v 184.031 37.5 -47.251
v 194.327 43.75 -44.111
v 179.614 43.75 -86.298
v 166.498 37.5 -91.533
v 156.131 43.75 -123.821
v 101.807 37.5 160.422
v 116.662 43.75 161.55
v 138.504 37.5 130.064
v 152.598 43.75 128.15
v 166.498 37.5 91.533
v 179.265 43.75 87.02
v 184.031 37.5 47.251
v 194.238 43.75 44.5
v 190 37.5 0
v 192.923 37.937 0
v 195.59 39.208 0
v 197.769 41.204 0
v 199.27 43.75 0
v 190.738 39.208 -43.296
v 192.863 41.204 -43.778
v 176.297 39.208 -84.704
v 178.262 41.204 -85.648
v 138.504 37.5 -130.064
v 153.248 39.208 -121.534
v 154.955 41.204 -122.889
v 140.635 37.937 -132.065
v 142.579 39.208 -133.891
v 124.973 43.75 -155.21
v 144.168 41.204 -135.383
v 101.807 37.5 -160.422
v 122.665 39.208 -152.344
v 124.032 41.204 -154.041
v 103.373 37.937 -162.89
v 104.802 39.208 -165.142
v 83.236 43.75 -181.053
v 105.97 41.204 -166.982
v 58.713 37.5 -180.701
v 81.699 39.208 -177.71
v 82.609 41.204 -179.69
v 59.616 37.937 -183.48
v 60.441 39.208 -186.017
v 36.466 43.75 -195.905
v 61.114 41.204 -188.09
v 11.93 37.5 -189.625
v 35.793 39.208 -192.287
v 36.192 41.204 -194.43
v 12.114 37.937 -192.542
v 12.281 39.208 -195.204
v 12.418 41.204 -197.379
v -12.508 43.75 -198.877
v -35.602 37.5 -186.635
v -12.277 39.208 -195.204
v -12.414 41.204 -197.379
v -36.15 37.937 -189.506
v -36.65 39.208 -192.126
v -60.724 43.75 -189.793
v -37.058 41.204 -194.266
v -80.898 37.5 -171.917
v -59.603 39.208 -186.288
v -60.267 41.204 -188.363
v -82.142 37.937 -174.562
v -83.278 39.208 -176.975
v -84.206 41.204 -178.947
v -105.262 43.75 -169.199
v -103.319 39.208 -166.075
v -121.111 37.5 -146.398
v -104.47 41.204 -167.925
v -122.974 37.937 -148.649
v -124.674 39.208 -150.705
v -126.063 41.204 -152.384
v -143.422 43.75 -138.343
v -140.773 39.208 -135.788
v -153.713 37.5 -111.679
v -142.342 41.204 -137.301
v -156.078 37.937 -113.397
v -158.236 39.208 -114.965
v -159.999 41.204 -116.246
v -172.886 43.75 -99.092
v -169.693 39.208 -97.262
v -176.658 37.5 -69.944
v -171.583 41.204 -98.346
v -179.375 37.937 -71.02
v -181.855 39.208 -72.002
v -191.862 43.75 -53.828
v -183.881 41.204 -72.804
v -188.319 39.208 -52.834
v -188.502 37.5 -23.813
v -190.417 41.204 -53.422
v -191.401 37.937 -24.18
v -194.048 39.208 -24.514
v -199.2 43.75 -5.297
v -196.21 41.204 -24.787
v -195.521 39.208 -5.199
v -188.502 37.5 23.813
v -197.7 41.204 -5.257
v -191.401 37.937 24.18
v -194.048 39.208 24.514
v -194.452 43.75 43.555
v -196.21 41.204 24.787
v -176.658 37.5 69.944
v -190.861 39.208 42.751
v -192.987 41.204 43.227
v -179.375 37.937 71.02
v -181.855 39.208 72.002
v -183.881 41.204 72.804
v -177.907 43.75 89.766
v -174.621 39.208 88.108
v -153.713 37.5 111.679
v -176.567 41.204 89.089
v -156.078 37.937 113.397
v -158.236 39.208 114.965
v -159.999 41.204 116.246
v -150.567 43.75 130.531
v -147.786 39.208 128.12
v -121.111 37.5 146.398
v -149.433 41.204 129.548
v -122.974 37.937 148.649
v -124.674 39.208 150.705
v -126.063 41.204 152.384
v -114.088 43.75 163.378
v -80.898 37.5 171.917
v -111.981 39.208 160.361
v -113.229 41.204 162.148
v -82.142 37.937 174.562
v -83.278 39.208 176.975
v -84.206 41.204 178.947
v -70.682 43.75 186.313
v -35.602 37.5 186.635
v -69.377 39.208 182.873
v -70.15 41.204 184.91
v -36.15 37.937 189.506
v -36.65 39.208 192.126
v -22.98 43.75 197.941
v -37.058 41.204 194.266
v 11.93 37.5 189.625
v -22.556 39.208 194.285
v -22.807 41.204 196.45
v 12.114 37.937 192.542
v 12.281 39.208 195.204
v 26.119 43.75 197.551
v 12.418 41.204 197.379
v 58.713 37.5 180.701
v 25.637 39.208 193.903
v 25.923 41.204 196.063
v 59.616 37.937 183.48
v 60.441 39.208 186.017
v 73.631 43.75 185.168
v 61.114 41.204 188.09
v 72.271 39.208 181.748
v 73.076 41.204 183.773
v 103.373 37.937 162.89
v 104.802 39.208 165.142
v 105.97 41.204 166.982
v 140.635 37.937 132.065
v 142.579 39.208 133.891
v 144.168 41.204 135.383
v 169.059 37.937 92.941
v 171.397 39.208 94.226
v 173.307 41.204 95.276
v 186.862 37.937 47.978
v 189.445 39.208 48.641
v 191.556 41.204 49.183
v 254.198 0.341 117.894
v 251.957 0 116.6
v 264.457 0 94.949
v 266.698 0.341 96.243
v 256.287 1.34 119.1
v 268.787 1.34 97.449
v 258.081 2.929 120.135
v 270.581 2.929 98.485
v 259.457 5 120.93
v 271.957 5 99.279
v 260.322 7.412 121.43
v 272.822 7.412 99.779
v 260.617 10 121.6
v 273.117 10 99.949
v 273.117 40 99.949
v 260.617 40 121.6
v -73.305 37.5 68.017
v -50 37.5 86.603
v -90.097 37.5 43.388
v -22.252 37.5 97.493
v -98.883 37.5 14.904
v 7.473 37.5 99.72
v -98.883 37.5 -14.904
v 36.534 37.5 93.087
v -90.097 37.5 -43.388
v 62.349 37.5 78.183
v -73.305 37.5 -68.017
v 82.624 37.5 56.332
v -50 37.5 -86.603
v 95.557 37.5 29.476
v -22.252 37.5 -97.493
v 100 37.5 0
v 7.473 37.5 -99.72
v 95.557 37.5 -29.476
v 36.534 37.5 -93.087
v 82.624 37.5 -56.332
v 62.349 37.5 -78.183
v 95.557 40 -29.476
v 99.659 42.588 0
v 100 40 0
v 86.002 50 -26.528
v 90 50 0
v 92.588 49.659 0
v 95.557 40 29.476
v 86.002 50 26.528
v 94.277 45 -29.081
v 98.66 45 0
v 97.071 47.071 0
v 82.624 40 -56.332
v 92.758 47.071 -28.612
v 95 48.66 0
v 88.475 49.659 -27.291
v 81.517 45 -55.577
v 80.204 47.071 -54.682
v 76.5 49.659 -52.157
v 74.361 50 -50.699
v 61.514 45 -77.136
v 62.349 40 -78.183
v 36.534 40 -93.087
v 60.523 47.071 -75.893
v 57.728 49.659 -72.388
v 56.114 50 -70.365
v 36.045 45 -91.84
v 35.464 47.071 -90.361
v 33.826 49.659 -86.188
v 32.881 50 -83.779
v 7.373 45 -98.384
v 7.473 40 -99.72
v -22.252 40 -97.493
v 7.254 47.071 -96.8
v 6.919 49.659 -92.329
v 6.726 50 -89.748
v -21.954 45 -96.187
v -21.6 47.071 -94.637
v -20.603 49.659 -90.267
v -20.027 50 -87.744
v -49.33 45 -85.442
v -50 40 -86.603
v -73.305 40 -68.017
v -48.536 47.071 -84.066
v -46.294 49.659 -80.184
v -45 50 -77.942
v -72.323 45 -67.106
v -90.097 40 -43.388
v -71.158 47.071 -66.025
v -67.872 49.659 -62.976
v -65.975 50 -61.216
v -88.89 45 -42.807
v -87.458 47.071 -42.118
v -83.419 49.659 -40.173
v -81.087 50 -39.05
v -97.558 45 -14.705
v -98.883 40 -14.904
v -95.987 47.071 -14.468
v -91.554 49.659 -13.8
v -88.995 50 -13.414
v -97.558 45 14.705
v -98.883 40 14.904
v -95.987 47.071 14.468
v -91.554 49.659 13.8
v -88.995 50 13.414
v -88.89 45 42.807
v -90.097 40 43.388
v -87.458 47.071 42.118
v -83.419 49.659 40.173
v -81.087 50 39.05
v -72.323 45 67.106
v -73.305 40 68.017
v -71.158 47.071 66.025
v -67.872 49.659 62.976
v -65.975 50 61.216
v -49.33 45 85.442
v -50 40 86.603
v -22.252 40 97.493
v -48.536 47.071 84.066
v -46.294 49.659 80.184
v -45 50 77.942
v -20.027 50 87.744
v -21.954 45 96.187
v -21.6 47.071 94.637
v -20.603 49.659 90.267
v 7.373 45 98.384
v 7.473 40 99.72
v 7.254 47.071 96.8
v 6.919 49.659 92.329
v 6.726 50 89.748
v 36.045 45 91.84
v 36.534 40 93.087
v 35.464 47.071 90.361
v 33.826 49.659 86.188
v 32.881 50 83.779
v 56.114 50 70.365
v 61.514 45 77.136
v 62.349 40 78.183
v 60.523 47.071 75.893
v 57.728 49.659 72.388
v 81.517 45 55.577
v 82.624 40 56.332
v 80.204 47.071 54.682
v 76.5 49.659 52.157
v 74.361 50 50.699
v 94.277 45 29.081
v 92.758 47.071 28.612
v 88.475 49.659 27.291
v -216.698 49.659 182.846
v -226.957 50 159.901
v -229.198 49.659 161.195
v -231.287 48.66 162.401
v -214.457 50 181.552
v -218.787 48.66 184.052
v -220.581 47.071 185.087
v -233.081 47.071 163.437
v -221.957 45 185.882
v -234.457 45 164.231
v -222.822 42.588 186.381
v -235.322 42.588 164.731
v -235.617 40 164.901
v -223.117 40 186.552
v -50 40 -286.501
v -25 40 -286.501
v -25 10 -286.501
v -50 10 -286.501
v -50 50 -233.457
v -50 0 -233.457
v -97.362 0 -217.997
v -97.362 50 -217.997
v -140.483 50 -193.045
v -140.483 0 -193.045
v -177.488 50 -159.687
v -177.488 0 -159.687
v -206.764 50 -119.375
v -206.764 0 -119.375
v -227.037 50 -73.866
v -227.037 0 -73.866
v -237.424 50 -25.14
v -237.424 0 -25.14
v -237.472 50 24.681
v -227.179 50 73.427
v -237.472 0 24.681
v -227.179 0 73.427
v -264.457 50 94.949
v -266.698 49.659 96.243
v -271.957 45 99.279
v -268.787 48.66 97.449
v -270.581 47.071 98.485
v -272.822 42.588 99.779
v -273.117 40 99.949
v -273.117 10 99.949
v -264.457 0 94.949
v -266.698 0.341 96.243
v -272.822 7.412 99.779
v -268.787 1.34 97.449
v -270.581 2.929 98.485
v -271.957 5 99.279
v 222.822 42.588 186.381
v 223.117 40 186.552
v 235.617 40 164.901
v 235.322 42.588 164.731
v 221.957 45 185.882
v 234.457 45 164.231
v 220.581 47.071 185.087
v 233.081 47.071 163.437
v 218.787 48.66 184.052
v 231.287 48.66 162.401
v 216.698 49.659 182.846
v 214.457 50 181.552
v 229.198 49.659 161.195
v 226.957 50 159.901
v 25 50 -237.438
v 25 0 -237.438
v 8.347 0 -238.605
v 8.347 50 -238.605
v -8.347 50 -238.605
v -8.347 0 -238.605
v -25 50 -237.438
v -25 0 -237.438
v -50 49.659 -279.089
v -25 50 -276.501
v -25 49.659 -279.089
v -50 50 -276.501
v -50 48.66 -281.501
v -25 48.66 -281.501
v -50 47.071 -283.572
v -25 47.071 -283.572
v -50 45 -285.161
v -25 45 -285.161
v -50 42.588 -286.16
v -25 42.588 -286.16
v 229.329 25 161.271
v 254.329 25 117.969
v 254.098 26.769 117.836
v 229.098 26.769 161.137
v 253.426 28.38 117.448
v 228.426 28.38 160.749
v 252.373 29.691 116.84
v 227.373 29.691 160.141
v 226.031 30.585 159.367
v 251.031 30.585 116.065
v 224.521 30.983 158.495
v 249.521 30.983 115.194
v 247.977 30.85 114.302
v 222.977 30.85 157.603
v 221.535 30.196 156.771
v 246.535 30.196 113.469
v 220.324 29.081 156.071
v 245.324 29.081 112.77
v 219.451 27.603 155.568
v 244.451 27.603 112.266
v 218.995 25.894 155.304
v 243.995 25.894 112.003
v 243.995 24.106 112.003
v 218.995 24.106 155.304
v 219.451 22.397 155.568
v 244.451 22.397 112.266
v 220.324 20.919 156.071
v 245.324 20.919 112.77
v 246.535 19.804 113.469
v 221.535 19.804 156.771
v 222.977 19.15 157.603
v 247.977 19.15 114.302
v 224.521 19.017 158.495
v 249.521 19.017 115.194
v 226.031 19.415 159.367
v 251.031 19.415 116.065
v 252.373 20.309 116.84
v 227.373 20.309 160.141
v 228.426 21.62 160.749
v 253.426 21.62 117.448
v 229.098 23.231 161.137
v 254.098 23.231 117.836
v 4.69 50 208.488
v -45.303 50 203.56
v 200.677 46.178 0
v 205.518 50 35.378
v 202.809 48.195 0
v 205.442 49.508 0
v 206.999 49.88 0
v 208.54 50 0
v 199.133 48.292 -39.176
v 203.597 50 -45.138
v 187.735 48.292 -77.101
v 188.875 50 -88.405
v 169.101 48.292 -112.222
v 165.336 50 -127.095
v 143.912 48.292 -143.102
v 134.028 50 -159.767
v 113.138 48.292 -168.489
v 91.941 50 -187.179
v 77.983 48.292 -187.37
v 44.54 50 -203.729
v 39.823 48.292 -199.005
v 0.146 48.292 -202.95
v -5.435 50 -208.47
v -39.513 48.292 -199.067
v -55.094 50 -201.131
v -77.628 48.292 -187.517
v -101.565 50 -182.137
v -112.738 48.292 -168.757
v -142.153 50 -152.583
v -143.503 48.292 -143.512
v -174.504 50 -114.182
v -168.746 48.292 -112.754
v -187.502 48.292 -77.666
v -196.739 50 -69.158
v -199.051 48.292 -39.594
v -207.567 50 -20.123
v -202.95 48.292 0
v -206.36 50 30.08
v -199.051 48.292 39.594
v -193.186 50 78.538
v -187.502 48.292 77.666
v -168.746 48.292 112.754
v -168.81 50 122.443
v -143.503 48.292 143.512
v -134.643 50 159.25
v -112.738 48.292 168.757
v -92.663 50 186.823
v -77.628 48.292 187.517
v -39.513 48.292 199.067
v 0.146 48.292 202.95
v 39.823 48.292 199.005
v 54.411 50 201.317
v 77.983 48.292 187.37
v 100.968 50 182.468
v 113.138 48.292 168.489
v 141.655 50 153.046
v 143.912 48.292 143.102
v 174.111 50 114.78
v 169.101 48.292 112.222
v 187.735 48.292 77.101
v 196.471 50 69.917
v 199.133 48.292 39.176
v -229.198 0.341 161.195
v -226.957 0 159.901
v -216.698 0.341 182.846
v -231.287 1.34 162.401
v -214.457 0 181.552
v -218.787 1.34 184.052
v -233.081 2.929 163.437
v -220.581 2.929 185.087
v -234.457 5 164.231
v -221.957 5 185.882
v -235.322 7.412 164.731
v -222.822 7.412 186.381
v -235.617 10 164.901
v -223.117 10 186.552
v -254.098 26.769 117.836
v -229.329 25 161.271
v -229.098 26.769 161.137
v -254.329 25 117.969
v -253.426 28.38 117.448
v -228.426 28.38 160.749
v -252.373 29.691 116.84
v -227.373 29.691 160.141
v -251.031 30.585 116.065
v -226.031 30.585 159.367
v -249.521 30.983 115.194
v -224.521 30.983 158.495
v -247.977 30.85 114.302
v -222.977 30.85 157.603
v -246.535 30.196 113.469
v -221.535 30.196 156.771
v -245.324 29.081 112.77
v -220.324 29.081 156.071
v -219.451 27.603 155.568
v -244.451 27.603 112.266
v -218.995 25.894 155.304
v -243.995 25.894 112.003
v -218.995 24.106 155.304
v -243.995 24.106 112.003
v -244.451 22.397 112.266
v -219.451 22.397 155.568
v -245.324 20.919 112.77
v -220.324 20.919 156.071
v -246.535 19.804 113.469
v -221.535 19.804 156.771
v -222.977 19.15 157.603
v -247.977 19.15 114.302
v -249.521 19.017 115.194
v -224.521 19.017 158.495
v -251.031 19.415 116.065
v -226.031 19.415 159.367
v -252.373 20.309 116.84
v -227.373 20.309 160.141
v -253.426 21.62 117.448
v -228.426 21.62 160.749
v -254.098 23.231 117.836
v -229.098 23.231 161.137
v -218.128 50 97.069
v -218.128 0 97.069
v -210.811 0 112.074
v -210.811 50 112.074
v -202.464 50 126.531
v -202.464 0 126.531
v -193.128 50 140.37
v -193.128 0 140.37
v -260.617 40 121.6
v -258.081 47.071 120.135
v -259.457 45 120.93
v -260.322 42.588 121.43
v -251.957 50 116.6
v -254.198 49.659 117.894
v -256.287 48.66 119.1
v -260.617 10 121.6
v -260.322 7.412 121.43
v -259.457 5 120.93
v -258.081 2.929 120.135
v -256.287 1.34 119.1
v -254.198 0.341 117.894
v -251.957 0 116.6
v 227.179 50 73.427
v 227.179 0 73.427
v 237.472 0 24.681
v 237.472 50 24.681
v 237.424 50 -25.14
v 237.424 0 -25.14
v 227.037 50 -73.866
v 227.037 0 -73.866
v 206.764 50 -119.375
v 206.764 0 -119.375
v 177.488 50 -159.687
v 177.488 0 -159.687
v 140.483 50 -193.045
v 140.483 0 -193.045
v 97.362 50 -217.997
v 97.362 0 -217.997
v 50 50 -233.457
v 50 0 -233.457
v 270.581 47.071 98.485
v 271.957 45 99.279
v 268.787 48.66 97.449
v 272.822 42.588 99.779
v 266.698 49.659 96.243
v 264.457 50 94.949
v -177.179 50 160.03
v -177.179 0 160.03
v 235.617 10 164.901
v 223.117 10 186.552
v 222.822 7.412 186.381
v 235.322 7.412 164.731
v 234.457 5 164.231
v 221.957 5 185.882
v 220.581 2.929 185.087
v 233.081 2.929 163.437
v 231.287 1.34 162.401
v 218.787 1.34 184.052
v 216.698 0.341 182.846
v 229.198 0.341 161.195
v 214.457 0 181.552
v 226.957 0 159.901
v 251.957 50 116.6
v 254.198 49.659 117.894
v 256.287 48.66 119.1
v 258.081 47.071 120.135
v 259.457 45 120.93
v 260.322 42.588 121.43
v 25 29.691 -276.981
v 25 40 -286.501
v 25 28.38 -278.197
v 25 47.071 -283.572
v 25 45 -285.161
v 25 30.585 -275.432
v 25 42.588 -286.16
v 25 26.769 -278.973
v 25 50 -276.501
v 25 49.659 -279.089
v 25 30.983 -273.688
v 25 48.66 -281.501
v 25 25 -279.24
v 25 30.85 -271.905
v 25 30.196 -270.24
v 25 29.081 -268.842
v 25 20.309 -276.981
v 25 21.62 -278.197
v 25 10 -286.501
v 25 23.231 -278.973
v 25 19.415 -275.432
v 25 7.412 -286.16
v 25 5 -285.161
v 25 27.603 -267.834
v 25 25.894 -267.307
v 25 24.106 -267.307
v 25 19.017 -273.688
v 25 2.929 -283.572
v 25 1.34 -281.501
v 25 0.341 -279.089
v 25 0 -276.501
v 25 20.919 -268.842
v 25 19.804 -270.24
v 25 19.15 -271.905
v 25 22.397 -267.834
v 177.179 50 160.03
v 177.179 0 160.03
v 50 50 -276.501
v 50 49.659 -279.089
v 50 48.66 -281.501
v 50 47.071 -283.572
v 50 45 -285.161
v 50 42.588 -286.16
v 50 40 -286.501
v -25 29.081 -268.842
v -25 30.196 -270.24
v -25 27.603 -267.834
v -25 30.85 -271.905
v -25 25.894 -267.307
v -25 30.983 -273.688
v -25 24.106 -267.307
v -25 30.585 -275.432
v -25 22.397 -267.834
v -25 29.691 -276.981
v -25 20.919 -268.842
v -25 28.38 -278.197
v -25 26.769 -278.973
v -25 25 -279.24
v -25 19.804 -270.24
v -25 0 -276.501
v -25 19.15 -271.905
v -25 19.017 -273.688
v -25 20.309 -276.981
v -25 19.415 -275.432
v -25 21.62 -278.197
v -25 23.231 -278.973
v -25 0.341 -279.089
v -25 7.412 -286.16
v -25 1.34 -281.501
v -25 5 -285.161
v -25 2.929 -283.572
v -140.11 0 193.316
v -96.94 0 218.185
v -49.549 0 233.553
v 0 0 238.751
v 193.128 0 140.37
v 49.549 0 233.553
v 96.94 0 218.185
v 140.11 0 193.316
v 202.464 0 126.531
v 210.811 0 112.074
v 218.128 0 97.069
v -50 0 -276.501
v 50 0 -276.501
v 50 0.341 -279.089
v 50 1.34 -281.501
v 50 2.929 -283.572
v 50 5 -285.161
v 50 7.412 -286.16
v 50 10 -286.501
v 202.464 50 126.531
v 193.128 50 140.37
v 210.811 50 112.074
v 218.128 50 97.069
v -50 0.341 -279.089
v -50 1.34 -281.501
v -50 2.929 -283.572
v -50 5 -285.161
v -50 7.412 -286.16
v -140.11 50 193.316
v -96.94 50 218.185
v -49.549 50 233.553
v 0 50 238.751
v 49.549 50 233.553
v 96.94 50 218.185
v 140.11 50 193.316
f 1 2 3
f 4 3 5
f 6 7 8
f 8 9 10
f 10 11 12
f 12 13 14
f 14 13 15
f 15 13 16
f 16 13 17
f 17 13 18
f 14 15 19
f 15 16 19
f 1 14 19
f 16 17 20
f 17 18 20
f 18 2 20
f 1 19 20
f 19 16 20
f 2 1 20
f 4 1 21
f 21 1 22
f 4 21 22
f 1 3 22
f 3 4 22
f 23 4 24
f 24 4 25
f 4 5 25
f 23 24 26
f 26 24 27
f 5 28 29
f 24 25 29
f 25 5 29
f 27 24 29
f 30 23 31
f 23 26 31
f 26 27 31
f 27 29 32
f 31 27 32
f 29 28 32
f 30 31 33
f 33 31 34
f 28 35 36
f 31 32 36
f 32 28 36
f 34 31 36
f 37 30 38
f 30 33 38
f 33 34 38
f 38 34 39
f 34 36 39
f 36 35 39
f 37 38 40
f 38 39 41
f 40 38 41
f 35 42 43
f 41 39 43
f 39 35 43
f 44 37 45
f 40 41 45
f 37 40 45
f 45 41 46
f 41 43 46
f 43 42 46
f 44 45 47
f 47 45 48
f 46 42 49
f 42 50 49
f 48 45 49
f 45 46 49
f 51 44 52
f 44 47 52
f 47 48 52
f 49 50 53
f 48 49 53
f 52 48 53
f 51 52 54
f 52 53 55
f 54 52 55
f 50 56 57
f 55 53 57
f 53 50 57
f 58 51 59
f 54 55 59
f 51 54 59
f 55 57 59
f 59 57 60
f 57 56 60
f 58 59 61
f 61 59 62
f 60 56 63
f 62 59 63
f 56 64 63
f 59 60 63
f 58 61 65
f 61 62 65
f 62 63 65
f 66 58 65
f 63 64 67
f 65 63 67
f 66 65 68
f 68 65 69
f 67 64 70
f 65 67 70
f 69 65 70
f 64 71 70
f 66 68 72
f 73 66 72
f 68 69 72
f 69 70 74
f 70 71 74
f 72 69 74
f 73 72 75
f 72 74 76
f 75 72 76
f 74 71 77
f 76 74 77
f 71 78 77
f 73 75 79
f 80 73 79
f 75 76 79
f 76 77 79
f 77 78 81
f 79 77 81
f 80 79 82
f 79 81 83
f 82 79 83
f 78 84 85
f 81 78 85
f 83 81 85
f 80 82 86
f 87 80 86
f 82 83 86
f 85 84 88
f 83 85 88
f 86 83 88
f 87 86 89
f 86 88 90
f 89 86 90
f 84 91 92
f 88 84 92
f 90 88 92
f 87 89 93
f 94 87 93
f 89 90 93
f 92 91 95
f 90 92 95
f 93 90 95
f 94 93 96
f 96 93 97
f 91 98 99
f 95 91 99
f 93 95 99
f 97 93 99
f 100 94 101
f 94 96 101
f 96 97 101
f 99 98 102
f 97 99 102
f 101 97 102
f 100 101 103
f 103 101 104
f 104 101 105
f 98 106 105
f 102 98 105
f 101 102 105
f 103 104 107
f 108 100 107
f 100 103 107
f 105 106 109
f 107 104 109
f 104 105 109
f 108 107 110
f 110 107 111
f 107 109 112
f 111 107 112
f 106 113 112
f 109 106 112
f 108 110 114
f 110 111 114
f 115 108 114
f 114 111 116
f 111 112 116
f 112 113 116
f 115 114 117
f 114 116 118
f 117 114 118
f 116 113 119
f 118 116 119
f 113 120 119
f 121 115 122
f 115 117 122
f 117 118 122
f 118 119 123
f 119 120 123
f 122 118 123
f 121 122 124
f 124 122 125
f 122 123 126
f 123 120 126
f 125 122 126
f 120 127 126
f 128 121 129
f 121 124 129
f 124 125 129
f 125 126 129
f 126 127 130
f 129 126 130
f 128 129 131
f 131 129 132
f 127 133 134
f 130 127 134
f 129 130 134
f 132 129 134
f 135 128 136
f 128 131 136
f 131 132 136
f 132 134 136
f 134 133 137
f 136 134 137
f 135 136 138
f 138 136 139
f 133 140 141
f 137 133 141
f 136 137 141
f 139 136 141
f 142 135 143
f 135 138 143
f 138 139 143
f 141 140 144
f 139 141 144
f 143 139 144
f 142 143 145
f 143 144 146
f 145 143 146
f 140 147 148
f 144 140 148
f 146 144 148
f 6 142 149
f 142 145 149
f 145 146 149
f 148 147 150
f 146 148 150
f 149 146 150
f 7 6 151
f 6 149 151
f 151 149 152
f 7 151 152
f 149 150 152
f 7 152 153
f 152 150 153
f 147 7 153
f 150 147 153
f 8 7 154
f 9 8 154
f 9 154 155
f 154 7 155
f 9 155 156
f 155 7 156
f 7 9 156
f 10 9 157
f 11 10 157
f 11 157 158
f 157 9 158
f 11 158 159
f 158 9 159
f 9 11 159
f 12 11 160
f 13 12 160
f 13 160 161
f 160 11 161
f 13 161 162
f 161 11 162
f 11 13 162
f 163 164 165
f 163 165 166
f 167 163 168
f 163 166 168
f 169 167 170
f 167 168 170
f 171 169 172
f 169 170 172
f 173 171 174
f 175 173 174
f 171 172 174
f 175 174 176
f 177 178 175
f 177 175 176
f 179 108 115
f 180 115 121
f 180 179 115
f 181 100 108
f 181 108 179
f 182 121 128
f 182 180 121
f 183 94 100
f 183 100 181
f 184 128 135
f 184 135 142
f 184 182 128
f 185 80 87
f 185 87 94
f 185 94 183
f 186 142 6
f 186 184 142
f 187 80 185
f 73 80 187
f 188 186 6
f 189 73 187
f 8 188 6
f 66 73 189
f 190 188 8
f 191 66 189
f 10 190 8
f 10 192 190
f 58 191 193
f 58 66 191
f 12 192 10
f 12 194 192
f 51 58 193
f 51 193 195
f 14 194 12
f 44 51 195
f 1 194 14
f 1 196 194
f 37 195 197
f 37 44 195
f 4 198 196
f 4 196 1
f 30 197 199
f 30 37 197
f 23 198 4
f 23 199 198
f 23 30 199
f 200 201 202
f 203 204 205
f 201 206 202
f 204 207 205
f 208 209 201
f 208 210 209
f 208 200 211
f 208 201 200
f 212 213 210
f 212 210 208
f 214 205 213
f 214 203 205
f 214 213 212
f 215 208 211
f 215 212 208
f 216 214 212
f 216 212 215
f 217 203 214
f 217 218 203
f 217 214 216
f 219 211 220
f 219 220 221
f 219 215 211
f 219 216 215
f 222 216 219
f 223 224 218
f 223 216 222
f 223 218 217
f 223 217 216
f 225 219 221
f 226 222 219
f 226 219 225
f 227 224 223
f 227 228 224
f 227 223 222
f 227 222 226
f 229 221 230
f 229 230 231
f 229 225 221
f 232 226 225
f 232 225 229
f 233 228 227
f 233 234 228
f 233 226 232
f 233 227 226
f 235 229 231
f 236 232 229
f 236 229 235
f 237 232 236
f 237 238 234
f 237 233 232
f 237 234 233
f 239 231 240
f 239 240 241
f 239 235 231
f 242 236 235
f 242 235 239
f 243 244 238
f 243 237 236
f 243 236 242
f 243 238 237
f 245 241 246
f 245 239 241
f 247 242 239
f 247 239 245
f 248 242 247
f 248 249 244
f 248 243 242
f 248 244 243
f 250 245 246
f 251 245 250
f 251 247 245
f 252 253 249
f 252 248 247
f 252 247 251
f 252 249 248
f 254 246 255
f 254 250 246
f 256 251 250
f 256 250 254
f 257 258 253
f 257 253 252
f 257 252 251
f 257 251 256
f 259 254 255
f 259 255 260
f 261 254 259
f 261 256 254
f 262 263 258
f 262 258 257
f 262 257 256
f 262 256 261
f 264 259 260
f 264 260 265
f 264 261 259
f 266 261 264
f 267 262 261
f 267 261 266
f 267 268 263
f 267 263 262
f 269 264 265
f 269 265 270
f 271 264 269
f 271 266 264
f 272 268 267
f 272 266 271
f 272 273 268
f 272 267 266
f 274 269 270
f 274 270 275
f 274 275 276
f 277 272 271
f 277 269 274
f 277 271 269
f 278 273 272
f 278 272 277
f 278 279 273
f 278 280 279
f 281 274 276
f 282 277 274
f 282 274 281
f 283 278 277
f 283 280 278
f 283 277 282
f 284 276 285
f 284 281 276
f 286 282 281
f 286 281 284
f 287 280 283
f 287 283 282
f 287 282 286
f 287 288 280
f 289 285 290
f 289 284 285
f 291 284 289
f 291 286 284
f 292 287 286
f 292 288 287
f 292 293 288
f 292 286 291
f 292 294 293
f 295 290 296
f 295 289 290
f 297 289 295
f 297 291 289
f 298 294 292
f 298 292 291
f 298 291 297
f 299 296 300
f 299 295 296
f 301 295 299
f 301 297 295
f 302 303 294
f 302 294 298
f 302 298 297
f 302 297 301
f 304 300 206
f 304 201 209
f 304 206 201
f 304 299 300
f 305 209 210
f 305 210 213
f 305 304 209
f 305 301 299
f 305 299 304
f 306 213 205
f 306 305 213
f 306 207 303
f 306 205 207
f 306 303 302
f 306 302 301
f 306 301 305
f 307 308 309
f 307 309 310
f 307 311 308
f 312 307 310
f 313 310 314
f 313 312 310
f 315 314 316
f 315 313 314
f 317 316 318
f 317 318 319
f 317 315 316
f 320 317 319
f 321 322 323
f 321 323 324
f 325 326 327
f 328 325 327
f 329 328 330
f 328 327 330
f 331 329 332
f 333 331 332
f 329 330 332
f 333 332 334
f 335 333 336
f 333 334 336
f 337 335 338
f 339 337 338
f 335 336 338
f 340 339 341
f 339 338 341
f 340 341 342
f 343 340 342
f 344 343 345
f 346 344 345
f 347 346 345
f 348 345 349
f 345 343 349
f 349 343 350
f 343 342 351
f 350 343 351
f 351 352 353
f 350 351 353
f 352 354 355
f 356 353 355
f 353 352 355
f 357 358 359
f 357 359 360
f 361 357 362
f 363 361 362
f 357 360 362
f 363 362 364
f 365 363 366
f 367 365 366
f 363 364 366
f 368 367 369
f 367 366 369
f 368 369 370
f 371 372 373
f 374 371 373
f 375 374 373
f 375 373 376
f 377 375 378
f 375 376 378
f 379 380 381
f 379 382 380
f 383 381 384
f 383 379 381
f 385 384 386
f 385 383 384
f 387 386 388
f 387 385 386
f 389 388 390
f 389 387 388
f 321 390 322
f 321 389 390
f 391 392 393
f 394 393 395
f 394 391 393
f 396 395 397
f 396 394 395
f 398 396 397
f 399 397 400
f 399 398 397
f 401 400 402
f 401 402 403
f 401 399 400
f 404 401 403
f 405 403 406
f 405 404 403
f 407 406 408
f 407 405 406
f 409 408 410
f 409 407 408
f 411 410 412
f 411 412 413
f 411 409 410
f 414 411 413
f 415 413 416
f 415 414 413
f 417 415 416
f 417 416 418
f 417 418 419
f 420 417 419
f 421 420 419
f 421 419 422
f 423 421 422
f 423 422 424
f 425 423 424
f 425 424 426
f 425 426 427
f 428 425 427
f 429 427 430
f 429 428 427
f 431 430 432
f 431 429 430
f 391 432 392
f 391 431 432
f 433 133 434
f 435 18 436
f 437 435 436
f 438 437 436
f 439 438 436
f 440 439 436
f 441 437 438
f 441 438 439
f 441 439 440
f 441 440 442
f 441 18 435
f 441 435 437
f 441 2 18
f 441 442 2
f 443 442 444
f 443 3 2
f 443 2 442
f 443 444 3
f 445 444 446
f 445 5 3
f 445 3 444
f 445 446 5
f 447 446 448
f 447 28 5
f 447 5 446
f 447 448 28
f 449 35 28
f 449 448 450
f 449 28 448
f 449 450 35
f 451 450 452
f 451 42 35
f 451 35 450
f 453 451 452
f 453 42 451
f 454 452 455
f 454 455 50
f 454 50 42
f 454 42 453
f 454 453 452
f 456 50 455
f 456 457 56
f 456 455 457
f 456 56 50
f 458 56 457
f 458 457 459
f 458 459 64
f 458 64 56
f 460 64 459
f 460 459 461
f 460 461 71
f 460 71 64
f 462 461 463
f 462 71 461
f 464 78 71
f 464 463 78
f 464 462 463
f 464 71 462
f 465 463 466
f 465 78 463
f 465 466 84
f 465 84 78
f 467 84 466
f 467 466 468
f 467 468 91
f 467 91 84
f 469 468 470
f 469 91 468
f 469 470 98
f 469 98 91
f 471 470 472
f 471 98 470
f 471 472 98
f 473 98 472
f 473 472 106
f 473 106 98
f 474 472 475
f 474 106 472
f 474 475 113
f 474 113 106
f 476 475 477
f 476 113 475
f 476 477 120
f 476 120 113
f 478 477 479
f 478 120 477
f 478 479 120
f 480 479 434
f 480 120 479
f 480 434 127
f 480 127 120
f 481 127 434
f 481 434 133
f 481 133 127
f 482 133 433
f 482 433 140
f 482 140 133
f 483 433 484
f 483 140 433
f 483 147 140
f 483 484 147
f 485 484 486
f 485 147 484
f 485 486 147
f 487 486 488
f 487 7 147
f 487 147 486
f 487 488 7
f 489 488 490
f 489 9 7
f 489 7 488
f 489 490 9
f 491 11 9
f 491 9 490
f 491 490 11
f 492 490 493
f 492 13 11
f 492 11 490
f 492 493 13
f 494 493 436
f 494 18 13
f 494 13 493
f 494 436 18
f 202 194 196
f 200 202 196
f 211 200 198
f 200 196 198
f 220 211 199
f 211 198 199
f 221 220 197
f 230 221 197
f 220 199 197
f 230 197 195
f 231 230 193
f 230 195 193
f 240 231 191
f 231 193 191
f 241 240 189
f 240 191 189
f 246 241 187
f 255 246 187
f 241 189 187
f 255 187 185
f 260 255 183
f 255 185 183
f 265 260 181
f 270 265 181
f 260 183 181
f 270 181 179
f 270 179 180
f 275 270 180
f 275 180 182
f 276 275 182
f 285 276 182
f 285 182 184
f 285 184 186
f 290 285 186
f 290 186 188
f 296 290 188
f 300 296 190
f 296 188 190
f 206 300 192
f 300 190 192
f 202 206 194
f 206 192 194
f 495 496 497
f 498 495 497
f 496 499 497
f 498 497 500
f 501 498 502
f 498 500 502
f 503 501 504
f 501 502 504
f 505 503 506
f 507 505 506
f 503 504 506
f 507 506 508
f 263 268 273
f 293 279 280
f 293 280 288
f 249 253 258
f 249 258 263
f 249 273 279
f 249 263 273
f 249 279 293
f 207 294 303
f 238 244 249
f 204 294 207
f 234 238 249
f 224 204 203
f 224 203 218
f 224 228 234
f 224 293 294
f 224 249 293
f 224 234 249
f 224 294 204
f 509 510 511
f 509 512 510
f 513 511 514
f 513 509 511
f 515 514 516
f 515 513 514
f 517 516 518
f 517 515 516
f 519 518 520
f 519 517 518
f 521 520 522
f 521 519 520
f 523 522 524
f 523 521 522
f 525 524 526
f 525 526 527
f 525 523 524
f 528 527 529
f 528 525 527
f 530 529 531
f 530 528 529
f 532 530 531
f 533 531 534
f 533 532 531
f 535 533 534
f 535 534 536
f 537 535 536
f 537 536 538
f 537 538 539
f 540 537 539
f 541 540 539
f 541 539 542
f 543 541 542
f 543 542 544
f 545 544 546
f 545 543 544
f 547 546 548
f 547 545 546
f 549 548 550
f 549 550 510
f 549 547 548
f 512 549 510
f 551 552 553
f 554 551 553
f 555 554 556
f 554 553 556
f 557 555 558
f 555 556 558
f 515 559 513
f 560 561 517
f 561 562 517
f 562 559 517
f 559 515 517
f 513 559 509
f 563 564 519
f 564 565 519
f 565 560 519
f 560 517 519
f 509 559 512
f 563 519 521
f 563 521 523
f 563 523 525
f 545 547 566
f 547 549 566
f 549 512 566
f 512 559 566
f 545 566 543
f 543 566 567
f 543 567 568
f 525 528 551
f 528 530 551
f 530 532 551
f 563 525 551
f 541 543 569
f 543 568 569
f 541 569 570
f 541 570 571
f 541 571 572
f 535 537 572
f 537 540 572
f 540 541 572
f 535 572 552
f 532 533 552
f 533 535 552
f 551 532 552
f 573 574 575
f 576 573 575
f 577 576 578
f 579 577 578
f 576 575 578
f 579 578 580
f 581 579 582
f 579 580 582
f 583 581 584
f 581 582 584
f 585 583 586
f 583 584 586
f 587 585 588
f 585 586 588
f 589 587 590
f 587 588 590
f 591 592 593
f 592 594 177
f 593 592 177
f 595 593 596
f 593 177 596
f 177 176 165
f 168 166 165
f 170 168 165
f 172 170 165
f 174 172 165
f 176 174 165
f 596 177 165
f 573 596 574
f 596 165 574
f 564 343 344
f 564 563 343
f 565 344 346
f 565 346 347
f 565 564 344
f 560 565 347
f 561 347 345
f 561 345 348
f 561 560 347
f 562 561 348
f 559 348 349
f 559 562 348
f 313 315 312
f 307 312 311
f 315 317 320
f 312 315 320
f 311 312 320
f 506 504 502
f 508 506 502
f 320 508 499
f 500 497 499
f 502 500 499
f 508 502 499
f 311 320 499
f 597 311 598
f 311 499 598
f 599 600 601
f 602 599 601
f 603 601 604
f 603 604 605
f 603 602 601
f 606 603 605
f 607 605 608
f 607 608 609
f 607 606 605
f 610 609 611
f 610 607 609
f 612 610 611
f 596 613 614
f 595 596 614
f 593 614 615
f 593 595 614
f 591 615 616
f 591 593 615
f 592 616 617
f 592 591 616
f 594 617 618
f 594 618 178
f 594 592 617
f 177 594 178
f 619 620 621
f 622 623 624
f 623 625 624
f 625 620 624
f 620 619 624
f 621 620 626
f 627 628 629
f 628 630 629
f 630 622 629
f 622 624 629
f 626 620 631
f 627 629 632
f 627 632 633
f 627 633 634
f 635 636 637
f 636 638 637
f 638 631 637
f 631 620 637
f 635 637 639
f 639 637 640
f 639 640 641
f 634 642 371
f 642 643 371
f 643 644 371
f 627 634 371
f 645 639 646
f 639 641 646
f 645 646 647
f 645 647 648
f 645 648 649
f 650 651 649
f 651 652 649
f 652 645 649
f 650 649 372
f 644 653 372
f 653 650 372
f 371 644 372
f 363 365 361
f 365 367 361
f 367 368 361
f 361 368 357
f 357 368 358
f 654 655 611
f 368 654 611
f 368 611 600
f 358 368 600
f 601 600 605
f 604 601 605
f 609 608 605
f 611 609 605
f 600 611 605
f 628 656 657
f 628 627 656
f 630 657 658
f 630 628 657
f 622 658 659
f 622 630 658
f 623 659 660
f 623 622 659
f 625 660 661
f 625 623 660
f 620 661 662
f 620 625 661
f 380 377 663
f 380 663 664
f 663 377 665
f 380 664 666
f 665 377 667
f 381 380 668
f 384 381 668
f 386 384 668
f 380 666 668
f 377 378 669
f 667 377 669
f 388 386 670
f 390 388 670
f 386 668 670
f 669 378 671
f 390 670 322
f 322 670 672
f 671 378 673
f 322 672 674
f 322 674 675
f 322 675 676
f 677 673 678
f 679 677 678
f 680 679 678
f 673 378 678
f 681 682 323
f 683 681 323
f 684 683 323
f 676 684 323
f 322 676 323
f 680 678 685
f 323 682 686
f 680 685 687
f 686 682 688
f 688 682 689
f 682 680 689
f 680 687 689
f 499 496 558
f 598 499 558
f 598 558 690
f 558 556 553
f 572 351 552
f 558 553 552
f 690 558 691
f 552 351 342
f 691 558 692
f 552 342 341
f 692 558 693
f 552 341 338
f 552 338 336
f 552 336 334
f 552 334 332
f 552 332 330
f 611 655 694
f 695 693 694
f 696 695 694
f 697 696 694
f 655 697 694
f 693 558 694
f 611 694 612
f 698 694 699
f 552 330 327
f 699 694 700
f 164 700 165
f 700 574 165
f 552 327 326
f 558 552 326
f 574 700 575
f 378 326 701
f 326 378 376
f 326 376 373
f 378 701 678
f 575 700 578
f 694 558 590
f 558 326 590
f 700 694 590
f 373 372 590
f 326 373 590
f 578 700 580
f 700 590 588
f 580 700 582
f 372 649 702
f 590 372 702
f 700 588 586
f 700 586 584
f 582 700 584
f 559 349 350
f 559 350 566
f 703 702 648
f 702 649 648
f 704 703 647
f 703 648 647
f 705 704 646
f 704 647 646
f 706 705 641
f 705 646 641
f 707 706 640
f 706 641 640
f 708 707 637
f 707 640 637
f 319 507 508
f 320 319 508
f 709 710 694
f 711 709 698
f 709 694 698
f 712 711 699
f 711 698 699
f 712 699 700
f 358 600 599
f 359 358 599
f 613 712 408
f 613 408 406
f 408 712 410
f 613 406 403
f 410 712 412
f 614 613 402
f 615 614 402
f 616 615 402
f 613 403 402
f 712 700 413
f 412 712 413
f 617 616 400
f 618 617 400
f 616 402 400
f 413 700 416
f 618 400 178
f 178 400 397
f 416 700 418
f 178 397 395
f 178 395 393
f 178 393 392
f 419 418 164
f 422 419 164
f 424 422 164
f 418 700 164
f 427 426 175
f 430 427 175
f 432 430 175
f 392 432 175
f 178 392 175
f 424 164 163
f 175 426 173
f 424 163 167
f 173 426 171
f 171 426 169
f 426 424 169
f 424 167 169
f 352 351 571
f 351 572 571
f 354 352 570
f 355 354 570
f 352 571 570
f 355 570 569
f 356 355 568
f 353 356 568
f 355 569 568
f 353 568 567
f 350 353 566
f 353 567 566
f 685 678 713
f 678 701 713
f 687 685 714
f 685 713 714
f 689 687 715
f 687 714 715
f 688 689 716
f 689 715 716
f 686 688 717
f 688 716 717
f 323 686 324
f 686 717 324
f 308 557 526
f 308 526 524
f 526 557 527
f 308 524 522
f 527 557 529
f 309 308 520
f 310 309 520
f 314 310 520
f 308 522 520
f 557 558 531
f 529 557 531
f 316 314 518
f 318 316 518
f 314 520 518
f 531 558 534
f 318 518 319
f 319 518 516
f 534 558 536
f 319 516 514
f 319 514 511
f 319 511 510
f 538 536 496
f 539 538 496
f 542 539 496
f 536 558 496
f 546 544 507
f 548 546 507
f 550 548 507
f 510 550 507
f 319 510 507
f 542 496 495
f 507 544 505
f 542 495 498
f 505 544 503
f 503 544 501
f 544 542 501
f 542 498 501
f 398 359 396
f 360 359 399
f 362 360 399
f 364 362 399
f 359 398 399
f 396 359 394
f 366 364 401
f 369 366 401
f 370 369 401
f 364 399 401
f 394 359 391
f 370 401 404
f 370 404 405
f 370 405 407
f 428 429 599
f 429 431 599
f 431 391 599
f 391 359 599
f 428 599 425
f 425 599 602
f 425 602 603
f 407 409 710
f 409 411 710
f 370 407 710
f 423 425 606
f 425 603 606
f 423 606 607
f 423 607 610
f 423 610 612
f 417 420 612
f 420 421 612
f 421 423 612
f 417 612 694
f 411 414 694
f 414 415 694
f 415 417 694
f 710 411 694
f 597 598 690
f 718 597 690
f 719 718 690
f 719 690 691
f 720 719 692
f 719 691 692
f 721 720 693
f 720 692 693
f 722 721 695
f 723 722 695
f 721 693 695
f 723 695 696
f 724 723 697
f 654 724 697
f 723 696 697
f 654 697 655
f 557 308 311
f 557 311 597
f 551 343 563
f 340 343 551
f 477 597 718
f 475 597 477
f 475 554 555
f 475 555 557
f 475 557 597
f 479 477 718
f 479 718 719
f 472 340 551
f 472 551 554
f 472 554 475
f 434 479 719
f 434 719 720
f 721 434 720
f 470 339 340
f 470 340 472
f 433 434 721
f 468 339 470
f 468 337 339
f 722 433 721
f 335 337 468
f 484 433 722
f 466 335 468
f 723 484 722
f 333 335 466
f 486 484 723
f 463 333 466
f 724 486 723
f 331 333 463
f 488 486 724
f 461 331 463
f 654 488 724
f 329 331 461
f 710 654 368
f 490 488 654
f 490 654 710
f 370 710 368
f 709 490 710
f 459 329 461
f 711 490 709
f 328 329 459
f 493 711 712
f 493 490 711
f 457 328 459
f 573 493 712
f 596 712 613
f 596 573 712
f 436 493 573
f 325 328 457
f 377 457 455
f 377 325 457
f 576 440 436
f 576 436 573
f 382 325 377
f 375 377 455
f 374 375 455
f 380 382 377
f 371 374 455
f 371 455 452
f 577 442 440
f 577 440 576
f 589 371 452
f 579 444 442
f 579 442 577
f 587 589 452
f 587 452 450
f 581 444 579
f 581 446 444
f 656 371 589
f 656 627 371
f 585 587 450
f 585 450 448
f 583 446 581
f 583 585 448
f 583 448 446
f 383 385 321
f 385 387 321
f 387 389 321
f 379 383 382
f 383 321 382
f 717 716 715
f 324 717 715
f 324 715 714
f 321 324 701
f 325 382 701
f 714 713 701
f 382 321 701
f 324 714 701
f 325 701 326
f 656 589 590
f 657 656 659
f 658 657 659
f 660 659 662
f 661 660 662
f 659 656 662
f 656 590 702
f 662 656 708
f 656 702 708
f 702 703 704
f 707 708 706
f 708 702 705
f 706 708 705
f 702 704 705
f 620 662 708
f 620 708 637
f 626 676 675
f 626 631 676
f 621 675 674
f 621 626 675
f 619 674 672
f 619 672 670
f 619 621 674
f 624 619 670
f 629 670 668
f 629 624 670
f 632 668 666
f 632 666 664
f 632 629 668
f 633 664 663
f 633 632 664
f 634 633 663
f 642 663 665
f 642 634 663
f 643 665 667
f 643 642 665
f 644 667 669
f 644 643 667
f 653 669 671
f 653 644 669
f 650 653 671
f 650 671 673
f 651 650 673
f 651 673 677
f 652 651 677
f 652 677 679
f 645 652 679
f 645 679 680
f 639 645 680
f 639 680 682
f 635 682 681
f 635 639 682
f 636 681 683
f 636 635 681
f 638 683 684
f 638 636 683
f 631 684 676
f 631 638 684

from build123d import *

# Parameters (mm, degrees)
BOSS_EXTRUDE1_DEPTH = 50
SKETCH2_R           = 200
CUT_EXTRUDE1_DEPTH  = 12.5
SKETCH3_R           = 100
BOSS_EXTRUDE2_DEPTH = 12.5
FILLET1_R           = 10
FILLET8_R           = 10
FILLET10_R          = 10
FILLET11_R          = 10
SKETCH4_R           = 6
BOSS_EXTRUDE3_DEPTH = 36
CIRPATTERN1_COUNT   = 3


with BuildPart() as part:
    # Sketch1 → Boss-Extrude1 (new body)
    with BuildSketch(Plane(origin=(0, 0, 0), x_dir=(1, 0, 0), z_dir=(0, 1, 0))):
        with BuildLine():
            Line((177.17937854, -160.029588814), (223.117233569, -186.551821781))
            Line((223.117233569, -186.551821781), (235.617233569, -164.901186686))
            Line((235.617233569, -164.901186686), (193.127700242, -140.369843182))
            ThreePointArc((193.127700242, -140.369843182), (206.764361308, -119.37545966), (218.127700242, -97.068572993))
            Line((218.127700242, -97.068572993), (260.617233569, -121.599916497))
            Line((260.617233569, -121.599916497), (273.117233569, -99.949281403))
            Line((273.117233569, -99.949281403), (227.17937854, -73.427048436))
            ThreePointArc((227.17937854, -73.427048436), (206.764361308, 119.37545966), (50, 233.45663725))
            Line((50, 233.45663725), (50, 286.501103184))
            Line((50, 286.501103184), (25, 286.501103184))
            Line((25, 286.501103184), (25, 237.438416176))
            ThreePointArc((25, 237.438416176), (0, 238.75091932), (-25, 237.438416176))
            Line((-25, 237.438416176), (-25, 286.501103184))
            Line((-25, 286.501103184), (-50, 286.501103184))
            Line((-50, 286.501103184), (-50, 233.45663725))
            ThreePointArc((-50, 233.45663725), (-206.764361308, 119.37545966), (-227.17937854, -73.427048436))
            Line((-227.17937854, -73.427048436), (-273.117233569, -99.949281403))
            Line((-273.117233569, -99.949281403), (-260.617233569, -121.599916497))
            Line((-260.617233569, -121.599916497), (-218.127700242, -97.068572993))
            ThreePointArc((-218.127700242, -97.068572993), (-206.764361308, -119.37545966), (-193.127700242, -140.369843182))
            Line((-193.127700242, -140.369843182), (-235.617233569, -164.901186686))
            Line((-235.617233569, -164.901186686), (-223.117233569, -186.551821781))
            Line((-223.117233569, -186.551821781), (-177.17937854, -160.029588814))
            ThreePointArc((-177.17937854, -160.029588814), (0, -238.75091932), (177.17937854, -160.029588814))
        make_face()
    extrude(amount=BOSS_EXTRUDE1_DEPTH)

    # Sketch2 → Cut-Extrude1 (cut)
    with BuildSketch(Plane(origin=(0, 50, 0), x_dir=(1, 0, 0), z_dir=(0, 1, 0))):
        Circle(SKETCH2_R)
    extrude(amount=-CUT_EXTRUDE1_DEPTH, mode=Mode.SUBTRACT)

    # Sketch3 → Boss-Extrude2 (add)
    with BuildSketch(Plane(origin=(0, 37.5, 0), x_dir=(1, 0, 0), z_dir=(0, 1, 0))):
        Circle(SKETCH3_R)
    extrude(amount=BOSS_EXTRUDE2_DEPTH)

    # Fillet1
    fillet1_edges = [part.edges().sort_by_distance(p)[0] for p in [
        (-37.5, 50, -286.501103184),
        (37.5, 0, -286.501103184),
        (266.867233569, 0, 110.77459895),
        (229.367233569, 0, 175.726504234),
        (-229.367233569, 0, 175.726504234),
        (-266.867233569, 50, 110.77459895),
        (-266.867233569, 0, 110.77459895),
        (-37.5, 0, -286.501103184),
        (-229.367233569, 50, 175.726504234),
        (229.367233569, 50, 175.726504234),
        (266.867233569, 50, 110.77459895),
        (37.5, 50, -286.501103184),
    ]]
    fillet(fillet1_edges, radius=FILLET1_R)

    # Fillet8
    fillet8_edges = [part.edges().sort_by_distance(p)[0] for p in [
        (-100, 50, 0),
    ]]
    fillet(fillet8_edges, radius=FILLET8_R)

    # Fillet10
    fillet10_edges = [part.edges().sort_by_distance(p)[0] for p in [
        (-200, 37.5, 0),
    ]]
    fillet(fillet10_edges, radius=FILLET10_R)

    # Fillet11
    fillet11_edges = [part.edges().sort_by_distance(p)[0] for p in [
        (-200, 50, 0),
    ]]
    fillet(fillet11_edges, radius=FILLET11_R)

    # Sketch4 → Boss-Extrude3 (add, symmetric)
    with BuildSketch(Plane(origin=(0, 0, 0), x_dir=(0, 0, -1), z_dir=(1, 0, 0))):
        with Locations((273.2399867, 25)):
            Circle(SKETCH4_R)
    boss_extrude3 = extrude(amount=BOSS_EXTRUDE3_DEPTH, both=True)

    # CirPattern1: Boss-Extrude3 ×3 about axis
    cirpattern1_axis = Axis((0, 50, 0), (0, -1, 0))
    for i in range(1, CIRPATTERN1_COUNT):
        add(boss_extrude3.rotate(cirpattern1_axis, i * 360 / CIRPATTERN1_COUNT))


solid = part.part
